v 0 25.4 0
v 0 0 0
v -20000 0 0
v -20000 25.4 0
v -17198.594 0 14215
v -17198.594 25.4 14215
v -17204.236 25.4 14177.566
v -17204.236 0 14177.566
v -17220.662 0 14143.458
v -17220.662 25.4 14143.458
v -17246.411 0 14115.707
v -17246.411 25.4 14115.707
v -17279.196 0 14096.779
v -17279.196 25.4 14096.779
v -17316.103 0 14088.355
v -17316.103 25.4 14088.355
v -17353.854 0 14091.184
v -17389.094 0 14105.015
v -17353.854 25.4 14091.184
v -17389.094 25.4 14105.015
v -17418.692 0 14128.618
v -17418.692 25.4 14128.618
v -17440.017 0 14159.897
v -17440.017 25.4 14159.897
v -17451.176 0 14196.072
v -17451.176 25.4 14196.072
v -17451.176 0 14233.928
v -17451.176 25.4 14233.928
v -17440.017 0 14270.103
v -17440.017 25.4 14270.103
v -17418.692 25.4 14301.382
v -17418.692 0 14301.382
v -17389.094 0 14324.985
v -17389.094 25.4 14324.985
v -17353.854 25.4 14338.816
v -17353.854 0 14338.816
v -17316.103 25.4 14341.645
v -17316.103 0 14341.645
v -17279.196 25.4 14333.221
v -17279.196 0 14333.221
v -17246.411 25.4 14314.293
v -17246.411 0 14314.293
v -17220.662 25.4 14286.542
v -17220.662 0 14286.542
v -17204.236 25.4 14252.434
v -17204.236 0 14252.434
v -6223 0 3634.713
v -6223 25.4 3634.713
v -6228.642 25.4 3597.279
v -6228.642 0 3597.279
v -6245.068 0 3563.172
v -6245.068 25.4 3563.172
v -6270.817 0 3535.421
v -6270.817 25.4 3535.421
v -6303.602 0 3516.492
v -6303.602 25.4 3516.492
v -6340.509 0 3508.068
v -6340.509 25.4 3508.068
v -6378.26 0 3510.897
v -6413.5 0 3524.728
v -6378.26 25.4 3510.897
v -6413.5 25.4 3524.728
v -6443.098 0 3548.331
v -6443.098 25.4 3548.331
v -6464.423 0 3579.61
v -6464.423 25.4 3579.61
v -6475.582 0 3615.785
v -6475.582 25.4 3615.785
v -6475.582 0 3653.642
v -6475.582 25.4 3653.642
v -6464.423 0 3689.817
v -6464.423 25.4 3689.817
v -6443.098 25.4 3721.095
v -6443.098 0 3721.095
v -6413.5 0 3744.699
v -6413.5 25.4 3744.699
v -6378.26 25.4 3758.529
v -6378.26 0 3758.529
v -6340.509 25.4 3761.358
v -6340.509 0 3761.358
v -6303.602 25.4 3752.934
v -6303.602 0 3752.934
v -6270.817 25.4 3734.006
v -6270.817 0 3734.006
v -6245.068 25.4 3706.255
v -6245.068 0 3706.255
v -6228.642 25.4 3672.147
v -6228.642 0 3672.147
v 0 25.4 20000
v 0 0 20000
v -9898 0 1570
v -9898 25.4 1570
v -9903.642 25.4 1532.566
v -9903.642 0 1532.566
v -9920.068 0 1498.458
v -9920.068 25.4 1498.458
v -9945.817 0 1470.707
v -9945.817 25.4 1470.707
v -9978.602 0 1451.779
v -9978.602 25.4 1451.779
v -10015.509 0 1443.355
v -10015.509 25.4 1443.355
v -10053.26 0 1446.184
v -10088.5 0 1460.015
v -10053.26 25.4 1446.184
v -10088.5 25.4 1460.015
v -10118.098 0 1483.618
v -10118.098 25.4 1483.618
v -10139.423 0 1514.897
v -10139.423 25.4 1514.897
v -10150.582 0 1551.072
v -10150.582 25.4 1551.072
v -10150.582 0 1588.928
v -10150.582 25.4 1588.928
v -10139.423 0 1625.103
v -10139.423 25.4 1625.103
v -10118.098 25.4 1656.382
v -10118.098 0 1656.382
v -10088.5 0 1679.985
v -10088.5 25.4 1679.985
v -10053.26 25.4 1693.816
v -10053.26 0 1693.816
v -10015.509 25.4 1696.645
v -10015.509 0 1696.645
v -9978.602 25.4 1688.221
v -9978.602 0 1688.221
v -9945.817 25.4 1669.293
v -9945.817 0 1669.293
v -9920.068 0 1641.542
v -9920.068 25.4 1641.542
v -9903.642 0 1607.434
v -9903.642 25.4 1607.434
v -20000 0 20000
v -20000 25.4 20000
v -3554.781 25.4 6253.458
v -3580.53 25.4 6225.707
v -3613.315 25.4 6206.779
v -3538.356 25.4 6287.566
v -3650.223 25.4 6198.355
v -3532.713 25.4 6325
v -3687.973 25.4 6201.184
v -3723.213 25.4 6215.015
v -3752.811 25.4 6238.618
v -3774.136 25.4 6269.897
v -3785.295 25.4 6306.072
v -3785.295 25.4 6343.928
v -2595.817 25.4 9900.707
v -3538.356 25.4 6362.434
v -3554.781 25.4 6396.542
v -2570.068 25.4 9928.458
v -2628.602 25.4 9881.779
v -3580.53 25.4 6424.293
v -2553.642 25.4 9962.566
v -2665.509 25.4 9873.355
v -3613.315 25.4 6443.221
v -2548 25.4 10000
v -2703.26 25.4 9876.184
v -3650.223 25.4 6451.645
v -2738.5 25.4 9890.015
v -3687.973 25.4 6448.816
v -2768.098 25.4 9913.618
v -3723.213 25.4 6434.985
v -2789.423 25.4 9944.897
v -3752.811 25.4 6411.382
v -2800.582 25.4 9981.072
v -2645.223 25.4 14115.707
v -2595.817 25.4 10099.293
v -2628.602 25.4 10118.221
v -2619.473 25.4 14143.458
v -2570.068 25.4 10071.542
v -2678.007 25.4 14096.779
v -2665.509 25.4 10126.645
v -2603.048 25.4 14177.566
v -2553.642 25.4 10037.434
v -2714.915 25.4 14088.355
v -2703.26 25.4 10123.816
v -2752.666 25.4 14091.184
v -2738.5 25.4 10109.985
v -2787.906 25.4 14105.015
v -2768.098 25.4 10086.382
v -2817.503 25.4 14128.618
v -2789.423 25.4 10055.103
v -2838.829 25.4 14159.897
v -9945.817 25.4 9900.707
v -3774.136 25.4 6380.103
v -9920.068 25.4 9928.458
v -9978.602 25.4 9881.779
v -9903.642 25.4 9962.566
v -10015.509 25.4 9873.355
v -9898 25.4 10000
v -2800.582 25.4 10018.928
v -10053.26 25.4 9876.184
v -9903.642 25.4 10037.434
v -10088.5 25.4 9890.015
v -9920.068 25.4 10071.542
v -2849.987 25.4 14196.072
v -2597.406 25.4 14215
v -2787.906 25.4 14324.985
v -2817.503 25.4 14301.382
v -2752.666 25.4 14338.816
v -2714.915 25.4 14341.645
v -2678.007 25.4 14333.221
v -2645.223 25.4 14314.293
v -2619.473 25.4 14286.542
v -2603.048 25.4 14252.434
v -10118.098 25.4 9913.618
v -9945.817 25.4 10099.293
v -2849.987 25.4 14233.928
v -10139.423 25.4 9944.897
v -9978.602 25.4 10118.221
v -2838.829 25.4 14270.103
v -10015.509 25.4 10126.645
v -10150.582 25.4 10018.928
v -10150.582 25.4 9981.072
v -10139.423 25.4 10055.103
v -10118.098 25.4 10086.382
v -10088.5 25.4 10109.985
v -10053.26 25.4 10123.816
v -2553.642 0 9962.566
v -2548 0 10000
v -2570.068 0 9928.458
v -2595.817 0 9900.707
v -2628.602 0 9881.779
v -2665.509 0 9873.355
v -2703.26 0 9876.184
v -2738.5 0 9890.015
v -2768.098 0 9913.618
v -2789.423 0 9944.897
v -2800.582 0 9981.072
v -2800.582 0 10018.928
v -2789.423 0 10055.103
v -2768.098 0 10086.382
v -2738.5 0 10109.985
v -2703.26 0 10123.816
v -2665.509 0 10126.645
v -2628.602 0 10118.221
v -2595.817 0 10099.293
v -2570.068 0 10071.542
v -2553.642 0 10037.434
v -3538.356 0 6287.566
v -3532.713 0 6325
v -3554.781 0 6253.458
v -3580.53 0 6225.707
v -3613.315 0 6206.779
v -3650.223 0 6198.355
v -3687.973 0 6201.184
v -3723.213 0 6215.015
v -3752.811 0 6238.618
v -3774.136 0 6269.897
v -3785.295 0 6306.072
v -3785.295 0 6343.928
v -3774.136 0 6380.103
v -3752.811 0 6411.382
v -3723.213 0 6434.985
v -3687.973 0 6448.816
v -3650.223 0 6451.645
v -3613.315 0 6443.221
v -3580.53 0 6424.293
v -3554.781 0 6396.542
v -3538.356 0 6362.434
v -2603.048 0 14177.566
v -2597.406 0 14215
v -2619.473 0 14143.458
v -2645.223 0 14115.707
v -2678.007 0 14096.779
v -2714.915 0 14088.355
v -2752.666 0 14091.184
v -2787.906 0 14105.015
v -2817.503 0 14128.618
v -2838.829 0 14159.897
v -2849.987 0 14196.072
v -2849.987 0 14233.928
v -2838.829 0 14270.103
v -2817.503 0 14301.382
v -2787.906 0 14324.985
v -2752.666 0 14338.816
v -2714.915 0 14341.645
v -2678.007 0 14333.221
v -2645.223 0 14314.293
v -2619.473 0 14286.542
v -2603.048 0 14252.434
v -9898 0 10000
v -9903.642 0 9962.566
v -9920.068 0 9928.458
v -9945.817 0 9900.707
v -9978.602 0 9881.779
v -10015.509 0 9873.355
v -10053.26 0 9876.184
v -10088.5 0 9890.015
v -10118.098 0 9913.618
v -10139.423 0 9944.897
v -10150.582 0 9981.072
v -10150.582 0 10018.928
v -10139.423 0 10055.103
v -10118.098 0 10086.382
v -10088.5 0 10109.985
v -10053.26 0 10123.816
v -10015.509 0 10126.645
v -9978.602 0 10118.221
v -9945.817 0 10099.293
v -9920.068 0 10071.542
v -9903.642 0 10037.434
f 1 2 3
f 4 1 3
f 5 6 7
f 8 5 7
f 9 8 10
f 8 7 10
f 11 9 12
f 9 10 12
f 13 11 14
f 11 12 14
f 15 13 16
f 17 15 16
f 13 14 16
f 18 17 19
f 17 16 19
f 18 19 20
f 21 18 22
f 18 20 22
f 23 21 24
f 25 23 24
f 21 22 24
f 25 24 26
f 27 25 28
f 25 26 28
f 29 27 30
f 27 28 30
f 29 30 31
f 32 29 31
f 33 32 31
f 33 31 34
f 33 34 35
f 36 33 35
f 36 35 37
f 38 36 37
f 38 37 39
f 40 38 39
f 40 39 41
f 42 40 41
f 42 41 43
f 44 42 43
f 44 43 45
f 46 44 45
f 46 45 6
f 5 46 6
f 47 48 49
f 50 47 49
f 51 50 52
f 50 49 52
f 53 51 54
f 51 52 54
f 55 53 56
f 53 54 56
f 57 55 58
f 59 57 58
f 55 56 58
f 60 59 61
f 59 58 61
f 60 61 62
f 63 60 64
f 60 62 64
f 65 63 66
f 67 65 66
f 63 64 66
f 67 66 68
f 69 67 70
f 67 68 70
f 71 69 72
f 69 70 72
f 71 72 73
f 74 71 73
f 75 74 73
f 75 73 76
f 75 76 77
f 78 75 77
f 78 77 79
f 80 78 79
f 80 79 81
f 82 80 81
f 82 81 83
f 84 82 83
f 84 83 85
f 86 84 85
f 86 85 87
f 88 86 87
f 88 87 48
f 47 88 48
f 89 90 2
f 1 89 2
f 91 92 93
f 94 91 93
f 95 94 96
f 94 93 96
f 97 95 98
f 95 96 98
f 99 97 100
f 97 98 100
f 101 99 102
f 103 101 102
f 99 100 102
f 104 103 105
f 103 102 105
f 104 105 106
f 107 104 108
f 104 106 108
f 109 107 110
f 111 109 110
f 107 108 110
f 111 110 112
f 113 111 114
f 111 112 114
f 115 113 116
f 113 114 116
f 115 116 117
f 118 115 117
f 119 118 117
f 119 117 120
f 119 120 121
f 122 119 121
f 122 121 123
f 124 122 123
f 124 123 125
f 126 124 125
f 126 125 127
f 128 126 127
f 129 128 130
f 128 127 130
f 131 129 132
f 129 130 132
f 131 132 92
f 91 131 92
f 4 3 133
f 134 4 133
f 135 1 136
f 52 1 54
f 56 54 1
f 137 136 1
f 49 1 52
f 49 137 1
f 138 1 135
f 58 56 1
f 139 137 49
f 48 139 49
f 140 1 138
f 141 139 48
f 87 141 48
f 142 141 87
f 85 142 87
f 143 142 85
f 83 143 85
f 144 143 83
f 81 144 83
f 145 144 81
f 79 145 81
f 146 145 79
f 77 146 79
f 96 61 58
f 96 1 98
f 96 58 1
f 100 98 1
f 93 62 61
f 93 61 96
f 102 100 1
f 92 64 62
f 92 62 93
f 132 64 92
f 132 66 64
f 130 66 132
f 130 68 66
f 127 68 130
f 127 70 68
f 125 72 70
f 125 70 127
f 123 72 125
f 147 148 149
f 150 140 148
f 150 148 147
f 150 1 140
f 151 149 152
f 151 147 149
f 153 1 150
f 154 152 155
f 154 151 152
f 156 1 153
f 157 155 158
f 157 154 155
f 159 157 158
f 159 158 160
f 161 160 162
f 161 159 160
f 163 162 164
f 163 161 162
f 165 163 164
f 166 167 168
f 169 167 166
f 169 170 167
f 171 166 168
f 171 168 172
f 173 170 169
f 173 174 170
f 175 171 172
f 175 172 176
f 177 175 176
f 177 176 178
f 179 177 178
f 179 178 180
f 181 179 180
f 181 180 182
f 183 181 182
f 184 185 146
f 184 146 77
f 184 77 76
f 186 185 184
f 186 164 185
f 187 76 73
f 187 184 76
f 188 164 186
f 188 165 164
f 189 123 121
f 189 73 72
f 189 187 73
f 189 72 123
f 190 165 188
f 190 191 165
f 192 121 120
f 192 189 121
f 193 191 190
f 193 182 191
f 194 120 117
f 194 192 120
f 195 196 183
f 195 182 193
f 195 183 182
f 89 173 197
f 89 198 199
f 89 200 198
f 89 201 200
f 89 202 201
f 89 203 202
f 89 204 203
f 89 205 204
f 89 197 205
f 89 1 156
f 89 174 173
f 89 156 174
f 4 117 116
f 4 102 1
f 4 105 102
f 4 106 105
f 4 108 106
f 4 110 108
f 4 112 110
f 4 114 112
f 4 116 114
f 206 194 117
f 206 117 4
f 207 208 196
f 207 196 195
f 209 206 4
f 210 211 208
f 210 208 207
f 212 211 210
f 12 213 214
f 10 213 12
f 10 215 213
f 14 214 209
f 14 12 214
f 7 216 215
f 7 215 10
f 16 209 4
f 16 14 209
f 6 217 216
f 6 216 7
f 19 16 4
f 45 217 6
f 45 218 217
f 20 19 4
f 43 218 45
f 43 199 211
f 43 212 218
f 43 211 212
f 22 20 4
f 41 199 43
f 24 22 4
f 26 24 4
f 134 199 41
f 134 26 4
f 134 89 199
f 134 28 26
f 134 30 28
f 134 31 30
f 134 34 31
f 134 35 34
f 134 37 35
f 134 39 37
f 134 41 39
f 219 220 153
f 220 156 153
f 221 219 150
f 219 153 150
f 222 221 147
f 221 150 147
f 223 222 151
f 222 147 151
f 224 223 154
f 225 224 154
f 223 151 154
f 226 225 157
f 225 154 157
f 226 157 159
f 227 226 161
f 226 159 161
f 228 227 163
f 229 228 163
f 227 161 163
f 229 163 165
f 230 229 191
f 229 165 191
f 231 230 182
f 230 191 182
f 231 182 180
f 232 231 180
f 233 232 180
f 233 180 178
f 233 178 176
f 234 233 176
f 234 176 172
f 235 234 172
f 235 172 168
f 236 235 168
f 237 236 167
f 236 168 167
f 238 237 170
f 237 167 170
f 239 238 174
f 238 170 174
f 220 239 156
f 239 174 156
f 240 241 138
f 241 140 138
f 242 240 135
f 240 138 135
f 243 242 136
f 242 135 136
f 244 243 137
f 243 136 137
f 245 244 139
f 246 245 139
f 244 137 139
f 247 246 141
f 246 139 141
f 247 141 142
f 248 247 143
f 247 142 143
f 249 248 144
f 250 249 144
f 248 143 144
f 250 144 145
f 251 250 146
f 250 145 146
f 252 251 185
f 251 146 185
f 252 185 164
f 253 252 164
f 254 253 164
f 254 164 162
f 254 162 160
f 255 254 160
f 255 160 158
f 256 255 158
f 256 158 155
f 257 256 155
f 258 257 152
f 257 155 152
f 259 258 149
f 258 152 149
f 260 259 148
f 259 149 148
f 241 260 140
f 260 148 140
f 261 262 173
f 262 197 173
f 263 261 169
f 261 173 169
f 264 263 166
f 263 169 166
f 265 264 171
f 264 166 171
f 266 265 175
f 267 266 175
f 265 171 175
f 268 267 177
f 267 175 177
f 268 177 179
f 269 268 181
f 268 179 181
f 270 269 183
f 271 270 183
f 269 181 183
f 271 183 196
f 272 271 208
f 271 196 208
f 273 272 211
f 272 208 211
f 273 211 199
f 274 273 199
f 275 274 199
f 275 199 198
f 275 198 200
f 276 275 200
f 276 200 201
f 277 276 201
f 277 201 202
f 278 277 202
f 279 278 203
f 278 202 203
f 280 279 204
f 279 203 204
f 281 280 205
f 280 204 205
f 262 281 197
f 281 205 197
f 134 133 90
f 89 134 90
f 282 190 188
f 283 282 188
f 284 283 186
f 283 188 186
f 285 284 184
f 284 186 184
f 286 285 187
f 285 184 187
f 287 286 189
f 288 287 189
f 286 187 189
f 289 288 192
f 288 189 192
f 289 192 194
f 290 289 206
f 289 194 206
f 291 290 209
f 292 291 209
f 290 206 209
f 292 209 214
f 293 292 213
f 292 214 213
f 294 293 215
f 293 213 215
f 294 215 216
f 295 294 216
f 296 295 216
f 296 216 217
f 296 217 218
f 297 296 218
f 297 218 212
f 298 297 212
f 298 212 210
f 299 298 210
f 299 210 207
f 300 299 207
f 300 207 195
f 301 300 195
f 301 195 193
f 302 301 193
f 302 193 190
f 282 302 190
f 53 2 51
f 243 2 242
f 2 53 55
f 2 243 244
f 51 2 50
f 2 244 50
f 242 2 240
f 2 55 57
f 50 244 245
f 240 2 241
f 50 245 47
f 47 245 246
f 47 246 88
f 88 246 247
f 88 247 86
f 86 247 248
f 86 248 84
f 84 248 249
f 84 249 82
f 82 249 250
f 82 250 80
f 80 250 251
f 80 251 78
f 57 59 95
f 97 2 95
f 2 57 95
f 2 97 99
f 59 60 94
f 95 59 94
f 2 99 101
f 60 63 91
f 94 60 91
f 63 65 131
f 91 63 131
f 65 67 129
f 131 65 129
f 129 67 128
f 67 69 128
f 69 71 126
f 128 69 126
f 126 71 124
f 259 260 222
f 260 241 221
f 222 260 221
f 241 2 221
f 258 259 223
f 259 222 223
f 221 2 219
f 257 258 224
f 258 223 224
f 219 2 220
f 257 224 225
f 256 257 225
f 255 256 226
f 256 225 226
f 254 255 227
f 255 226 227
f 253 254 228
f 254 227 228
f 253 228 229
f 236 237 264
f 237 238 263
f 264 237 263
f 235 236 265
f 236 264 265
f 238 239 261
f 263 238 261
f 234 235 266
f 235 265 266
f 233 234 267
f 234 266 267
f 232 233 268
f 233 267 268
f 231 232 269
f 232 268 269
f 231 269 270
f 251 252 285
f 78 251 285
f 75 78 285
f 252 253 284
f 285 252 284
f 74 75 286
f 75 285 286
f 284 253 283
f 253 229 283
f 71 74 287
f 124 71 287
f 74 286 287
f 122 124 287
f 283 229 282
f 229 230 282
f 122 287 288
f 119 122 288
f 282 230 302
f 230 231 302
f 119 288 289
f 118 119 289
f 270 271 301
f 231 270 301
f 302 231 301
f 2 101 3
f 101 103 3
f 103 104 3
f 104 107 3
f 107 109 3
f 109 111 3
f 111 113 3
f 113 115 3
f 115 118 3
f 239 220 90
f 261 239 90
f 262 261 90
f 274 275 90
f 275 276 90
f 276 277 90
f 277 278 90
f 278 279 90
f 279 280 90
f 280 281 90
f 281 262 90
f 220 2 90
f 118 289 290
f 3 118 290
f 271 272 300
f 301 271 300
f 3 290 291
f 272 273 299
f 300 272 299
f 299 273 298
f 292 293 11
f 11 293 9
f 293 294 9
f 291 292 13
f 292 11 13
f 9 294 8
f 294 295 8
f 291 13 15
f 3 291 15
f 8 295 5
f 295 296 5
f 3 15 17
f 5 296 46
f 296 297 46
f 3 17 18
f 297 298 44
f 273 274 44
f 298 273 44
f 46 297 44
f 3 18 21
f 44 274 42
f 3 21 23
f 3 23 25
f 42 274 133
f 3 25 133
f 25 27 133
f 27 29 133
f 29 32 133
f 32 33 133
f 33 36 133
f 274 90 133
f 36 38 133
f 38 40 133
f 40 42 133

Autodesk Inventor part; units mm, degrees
ref_plane "YZ Plane" through (0, 0, 0) normal (1, 0, 0) x (0, 1, 0)
ref_plane "XZ Plane" through (0, 0, 0) normal (0, 1, 0) x (-1, 0, 0)
ref_plane "XY Plane" through (0, 0, 0) normal (0, 0, 1) x (1, 0, 0)
sketch "Sketch1" plane through (0, 0, 0) normal (0, 1, 0) x (-1, 0, 0)
  line L0 (0, 0) -> (20000, 0)
  line L1 (20000, 0) -> (20000, 20000)
  line L2 (20000, 20000) -> (0, 20000)
  line L3 (0, 20000) -> (0, 0)
  dimension "d0" = 20000
  dimension "d1" = 20000
extrude "outer" add sketch "Sketch1" along normal blind 25.4
sketch "Sketch2" plane through (0, 25.4, 0) normal (0, 1, 0) x (1, 0, 0)
  circle A0 centre (-10025, -10000) radius 127
  circle A1 centre (-10025, -1570) radius 127
  circle A2 centre (-2675, -10000) radius 127
  circle A3 centre (-17325.5942, -14215) radius 127
  circle A4 centre (-2724.4058, -14215) radius 127
  circle A5 centre (-3659.7133, -6325) radius 127
  circle A6 centre (-6350, -3634.7133) radius 127
  dimension "d4" = 254
  dimension "d5" = 254
  dimension "d6" = 8430
  dimension "d7" = 254
  dimension "d8" = 7350
  dimension "d11" = 360
  dimension "d15" = 60
extrude "polesPosts" cut sketch "Sketch2" against normal blind 25.4
properties part number "0fasteners"
